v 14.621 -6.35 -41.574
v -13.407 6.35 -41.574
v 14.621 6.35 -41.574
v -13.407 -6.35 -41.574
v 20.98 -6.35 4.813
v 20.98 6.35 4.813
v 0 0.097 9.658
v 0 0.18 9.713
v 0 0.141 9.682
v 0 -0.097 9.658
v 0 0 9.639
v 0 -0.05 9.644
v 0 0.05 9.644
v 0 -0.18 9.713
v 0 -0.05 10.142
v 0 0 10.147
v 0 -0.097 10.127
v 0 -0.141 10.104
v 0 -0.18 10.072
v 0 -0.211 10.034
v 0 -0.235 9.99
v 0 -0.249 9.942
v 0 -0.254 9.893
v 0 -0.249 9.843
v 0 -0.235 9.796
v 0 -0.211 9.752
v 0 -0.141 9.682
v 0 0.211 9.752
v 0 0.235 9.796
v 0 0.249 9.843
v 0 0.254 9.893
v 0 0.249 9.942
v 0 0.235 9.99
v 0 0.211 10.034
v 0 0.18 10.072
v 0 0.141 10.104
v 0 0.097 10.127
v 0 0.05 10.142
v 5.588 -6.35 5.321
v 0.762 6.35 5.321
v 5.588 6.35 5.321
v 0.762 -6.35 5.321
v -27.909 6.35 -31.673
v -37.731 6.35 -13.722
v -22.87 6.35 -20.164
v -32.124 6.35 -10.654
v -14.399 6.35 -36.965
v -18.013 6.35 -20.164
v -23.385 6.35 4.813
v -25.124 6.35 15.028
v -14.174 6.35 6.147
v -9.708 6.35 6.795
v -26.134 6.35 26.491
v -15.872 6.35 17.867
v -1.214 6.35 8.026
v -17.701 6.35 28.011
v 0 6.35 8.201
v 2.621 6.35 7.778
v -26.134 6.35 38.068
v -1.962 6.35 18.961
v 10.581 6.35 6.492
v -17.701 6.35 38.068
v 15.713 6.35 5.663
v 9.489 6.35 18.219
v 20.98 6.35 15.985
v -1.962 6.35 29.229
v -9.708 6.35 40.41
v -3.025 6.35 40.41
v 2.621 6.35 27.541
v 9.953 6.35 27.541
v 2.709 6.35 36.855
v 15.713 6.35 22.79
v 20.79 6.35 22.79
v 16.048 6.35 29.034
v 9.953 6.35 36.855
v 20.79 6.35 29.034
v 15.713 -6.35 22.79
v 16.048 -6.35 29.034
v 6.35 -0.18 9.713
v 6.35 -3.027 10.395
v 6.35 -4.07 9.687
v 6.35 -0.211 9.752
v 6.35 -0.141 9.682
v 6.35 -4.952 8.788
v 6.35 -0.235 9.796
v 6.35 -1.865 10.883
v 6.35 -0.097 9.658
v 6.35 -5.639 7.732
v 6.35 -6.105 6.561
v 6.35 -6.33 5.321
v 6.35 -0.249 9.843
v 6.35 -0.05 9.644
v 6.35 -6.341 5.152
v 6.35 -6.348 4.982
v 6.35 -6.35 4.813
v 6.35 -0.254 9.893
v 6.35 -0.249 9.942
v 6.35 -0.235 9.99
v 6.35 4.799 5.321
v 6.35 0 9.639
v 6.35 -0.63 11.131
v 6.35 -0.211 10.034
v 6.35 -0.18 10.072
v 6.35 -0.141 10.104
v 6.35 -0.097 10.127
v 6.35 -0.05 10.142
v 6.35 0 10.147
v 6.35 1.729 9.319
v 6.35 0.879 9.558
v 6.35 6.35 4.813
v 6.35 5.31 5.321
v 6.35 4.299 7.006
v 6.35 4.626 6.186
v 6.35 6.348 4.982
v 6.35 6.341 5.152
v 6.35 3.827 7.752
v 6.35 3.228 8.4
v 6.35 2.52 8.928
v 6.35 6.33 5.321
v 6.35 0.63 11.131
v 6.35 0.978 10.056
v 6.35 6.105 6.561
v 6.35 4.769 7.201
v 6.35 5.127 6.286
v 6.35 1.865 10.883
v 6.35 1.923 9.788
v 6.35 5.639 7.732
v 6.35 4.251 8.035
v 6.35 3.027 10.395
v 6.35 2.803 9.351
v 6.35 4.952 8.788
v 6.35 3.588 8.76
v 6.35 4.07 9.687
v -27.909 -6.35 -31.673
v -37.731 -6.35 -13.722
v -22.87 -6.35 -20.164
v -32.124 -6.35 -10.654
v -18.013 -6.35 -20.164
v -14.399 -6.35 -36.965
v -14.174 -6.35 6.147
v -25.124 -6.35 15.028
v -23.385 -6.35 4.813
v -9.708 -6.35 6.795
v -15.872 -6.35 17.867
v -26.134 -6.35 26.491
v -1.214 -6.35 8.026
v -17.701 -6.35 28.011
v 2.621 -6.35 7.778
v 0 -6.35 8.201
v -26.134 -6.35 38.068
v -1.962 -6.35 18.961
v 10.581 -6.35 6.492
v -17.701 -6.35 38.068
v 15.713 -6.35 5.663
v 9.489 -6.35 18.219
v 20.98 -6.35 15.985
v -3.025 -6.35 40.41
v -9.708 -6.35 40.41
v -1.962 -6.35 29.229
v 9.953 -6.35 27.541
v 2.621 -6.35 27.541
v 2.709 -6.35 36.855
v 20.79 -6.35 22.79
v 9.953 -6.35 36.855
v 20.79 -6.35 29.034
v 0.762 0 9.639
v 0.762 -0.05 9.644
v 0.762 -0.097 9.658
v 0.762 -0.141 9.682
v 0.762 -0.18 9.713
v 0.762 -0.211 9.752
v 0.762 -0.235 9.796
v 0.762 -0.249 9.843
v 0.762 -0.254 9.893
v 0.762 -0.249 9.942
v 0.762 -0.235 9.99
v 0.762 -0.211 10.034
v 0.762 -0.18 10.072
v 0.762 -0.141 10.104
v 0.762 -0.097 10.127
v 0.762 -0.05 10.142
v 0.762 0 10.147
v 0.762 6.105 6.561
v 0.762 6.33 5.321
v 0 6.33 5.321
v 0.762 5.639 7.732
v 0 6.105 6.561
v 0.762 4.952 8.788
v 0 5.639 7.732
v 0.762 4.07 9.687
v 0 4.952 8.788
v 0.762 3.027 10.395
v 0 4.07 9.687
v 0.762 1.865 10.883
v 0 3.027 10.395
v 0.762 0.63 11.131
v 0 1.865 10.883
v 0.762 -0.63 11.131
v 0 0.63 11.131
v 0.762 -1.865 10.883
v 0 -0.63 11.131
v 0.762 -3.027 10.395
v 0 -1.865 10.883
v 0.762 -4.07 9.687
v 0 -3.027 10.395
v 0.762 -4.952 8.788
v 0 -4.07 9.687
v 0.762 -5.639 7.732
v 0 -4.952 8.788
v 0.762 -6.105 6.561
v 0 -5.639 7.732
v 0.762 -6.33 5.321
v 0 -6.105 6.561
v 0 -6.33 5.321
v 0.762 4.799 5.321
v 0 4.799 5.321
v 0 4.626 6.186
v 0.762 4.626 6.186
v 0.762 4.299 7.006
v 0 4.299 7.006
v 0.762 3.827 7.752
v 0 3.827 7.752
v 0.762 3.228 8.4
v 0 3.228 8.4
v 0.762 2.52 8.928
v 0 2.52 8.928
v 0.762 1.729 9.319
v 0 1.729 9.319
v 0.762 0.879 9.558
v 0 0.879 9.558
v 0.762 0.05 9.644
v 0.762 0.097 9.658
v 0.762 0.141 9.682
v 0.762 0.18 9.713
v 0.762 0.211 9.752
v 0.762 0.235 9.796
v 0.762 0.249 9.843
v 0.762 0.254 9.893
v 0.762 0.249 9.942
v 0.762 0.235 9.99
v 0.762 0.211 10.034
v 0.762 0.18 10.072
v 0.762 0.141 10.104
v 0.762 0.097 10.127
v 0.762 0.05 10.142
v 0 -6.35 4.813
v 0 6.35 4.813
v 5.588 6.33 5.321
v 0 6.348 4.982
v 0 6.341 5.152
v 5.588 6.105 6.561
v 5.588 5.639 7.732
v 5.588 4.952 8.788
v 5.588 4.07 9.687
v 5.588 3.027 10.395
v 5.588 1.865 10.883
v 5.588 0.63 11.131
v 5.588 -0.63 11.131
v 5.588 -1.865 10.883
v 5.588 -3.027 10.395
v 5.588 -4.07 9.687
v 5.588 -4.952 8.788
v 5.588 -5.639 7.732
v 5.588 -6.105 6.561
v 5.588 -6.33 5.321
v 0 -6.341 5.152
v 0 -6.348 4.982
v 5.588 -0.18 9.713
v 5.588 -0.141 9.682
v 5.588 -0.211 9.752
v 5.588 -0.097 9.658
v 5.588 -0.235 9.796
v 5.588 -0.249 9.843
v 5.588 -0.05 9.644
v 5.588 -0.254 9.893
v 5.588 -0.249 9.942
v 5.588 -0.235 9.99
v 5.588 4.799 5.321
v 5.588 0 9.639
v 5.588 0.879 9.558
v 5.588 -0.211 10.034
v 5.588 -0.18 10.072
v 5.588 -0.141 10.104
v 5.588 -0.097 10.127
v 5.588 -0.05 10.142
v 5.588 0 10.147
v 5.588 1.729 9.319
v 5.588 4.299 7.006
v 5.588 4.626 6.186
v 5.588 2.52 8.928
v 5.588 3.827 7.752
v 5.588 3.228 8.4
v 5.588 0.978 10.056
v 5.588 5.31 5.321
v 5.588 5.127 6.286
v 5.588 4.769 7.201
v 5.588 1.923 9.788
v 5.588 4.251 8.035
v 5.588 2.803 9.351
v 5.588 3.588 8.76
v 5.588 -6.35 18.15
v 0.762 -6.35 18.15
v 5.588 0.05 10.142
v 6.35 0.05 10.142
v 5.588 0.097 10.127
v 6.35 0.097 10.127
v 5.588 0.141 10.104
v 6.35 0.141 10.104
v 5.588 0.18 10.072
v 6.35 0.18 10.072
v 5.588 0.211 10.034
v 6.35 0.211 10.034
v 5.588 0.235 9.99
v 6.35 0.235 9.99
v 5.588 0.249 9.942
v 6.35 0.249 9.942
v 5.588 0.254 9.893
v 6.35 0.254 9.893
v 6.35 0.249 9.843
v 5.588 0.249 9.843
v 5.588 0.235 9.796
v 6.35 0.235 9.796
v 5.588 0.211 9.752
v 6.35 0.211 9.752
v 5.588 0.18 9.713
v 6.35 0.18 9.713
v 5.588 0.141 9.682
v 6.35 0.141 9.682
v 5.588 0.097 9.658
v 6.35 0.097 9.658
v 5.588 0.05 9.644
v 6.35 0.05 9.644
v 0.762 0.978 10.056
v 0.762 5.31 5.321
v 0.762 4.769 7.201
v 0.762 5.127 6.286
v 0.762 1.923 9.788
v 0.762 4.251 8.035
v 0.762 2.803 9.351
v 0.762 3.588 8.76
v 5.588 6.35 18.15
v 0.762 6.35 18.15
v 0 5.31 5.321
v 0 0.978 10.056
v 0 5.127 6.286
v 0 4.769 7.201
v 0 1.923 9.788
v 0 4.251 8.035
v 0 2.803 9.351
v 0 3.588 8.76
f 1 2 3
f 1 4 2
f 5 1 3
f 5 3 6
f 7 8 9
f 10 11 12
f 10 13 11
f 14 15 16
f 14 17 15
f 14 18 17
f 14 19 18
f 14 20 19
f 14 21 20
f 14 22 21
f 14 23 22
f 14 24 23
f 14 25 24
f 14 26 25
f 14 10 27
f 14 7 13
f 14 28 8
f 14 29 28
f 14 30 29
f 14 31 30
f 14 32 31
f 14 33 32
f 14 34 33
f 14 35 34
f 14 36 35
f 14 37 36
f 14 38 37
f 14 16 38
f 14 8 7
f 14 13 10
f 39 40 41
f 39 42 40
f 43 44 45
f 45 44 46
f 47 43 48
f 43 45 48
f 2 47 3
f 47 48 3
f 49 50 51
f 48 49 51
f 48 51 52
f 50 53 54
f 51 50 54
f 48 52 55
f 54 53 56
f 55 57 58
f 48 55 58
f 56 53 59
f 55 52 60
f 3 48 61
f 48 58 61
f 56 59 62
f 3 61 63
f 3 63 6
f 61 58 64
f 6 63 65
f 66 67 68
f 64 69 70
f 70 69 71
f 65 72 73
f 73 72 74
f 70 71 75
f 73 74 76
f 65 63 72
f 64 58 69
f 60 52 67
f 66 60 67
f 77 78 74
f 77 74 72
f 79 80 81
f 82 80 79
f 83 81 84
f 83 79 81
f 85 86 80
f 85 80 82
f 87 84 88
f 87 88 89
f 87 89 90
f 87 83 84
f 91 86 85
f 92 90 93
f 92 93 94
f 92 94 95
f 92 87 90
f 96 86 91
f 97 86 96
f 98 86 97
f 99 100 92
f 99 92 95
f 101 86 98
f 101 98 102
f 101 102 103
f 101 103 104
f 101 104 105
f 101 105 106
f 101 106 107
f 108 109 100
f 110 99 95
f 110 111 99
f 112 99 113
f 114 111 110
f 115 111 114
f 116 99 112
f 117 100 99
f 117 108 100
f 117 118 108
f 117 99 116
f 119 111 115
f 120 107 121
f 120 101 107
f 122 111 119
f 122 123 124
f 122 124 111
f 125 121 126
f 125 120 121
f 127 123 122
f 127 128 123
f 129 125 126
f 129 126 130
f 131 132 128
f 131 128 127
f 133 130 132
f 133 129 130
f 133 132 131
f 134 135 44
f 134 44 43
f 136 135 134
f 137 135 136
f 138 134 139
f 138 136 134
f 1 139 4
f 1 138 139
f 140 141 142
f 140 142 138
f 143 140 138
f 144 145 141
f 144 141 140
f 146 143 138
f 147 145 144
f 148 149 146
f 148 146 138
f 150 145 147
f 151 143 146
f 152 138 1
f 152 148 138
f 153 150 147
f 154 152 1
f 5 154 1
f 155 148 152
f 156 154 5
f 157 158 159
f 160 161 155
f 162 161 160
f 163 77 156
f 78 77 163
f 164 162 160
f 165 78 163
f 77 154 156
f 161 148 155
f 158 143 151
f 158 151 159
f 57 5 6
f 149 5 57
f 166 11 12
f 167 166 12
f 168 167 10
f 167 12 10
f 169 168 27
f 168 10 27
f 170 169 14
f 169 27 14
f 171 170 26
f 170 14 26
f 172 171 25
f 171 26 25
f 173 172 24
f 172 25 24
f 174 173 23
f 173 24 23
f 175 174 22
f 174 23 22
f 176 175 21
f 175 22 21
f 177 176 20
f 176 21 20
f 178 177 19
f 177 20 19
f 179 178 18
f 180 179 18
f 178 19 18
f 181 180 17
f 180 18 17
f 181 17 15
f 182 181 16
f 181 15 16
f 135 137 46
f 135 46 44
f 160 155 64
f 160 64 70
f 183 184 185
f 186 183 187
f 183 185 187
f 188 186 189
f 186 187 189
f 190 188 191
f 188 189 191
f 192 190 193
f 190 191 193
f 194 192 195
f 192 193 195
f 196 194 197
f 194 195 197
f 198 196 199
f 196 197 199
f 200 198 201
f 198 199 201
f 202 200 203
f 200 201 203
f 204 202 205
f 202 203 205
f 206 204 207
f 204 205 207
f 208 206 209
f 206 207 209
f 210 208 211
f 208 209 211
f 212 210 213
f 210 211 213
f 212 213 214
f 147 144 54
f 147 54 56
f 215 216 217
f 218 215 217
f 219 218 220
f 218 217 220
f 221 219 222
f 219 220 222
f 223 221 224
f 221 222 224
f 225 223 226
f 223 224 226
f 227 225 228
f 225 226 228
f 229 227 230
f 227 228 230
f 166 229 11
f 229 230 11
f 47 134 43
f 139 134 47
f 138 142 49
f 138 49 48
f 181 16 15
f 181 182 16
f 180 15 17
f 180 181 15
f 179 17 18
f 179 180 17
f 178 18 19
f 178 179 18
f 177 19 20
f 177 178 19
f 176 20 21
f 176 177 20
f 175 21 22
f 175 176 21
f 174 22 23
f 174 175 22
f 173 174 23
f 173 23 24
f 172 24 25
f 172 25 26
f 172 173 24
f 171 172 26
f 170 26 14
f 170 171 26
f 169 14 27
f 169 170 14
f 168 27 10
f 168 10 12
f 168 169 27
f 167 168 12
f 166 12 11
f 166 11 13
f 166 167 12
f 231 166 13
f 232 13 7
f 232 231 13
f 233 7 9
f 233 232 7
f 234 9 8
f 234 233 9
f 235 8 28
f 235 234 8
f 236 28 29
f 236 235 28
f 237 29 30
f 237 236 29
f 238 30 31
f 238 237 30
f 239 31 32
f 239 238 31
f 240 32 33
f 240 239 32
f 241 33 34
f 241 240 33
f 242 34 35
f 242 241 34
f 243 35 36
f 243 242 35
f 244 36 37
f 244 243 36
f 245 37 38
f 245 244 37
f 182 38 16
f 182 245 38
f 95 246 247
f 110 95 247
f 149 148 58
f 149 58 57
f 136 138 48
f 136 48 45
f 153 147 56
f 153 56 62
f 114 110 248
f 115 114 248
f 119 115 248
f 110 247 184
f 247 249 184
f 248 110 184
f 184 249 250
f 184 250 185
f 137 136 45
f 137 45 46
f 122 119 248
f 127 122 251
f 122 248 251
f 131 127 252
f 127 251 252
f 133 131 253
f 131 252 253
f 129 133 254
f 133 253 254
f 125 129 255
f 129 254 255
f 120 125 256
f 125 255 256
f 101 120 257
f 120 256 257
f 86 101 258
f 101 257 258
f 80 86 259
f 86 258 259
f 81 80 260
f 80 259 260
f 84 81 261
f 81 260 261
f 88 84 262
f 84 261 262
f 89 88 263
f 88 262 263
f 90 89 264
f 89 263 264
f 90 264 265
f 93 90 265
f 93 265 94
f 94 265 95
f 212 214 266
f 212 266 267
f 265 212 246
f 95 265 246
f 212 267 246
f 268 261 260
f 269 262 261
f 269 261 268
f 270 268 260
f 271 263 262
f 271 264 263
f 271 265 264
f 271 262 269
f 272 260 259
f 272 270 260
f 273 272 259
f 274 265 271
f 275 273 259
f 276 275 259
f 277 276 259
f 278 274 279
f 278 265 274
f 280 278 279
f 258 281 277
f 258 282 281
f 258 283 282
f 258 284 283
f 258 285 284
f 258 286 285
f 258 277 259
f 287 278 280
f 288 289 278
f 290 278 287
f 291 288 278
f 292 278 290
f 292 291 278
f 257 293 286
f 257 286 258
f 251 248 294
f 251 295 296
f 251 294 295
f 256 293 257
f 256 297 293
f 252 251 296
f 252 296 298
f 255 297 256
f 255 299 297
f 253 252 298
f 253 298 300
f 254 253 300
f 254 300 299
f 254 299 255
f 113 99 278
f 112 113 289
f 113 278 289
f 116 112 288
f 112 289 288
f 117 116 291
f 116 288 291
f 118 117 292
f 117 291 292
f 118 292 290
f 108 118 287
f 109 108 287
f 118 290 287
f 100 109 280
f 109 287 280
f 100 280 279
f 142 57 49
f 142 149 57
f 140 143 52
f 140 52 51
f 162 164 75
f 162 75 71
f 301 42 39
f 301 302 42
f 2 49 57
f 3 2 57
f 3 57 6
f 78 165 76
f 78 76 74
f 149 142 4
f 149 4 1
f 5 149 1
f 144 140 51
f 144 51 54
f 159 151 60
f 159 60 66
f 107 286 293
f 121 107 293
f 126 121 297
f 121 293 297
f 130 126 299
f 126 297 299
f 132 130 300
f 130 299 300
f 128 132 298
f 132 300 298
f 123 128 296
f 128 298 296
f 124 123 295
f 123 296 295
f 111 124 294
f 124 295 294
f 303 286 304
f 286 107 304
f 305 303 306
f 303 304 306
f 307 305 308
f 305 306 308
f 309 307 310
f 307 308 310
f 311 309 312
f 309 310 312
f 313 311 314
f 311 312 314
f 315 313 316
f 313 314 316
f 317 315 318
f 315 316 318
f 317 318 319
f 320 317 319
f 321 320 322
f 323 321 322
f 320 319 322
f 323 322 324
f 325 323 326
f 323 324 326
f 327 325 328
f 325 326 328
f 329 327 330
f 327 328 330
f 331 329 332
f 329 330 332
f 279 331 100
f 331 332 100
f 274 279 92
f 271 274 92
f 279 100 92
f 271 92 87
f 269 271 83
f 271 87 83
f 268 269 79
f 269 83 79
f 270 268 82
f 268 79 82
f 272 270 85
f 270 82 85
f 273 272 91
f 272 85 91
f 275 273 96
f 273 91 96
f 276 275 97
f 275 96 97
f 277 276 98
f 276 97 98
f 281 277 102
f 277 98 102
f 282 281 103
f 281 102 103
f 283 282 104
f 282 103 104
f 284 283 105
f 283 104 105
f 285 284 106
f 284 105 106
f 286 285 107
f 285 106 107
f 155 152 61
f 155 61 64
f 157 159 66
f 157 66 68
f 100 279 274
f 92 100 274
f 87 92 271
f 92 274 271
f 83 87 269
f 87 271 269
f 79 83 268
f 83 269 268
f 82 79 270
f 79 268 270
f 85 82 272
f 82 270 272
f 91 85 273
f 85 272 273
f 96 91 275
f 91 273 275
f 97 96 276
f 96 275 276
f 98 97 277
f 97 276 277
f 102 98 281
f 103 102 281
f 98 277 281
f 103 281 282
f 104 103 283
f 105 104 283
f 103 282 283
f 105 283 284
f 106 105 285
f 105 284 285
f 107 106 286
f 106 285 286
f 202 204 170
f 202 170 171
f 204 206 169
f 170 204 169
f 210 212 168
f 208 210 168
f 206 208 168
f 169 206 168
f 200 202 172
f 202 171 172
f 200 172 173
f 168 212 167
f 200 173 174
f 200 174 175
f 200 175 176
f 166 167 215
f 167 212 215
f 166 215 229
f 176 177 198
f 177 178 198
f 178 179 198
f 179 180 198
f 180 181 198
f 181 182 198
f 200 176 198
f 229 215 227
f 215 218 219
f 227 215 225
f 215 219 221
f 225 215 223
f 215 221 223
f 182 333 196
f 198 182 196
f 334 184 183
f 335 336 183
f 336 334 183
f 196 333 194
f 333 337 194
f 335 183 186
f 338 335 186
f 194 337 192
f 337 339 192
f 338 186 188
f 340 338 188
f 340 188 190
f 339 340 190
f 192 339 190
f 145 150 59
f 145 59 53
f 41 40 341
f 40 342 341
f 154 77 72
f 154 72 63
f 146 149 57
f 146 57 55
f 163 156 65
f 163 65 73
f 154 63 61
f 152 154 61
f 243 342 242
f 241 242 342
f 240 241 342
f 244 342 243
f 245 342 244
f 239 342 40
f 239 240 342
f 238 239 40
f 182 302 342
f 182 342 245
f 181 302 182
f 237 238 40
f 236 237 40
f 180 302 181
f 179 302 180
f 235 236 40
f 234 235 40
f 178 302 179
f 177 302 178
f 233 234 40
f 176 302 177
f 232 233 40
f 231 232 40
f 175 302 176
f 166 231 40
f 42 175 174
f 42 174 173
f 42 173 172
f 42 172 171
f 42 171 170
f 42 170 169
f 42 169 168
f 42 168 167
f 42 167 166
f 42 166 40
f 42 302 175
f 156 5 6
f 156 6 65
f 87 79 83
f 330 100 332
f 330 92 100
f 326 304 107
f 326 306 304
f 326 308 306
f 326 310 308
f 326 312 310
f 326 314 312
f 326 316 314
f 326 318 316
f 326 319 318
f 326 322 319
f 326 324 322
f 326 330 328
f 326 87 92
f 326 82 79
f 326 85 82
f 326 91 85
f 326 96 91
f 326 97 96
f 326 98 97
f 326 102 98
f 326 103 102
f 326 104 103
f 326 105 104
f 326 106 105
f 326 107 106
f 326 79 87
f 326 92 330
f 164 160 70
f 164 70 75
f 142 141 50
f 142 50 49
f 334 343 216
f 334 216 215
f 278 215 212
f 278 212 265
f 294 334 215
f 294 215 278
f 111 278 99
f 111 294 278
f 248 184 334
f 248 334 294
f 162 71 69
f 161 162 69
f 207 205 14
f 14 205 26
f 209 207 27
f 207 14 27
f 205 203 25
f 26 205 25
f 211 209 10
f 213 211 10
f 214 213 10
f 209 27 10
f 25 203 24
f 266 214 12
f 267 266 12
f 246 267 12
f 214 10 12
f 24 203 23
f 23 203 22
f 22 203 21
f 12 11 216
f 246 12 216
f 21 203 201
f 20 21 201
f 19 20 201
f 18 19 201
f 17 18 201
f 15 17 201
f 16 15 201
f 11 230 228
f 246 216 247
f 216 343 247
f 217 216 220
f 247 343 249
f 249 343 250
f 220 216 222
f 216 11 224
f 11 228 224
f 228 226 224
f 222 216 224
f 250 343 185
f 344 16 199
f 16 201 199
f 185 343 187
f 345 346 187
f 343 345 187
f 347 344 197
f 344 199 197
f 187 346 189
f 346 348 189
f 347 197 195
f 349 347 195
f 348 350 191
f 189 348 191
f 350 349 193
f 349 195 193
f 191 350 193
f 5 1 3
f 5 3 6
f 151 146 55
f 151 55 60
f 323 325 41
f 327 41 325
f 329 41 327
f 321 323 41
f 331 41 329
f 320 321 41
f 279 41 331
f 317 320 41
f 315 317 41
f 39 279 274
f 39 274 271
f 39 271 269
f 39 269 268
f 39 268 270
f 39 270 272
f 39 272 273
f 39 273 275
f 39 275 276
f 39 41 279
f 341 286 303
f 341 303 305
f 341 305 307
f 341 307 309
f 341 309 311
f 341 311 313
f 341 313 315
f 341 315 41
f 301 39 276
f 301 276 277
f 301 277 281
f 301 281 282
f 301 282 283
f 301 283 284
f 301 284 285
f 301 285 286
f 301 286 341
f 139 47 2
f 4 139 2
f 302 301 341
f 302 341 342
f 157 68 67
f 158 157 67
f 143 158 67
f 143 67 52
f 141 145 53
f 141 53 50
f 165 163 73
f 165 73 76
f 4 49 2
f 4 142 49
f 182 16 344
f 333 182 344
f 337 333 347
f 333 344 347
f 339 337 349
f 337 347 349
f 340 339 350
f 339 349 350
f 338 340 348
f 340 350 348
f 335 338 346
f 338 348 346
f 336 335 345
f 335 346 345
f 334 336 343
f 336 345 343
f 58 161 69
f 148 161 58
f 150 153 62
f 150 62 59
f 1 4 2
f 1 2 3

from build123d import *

# Parameters (mm, degrees)
F1_DEPTH      = 6.35
F3_DEPTH      = 6.35
F5_DEPTH      = 6.35
F6_W          = 4.826
F6_H          = 6.6525887966
F7_DEPTH      = 6.351
F7_DEPTH_BACK = 6.351
F9_DEPTH      = 6.35
F8_W          = 0.762
F8_H          = 0.254


with BuildPart() as f1:
    # F0 (on Front) → F1 (new body, symmetric)
    with BuildSketch(Plane.XZ):
        Polygon((-13.4074734524, -41.5735170245), (14.6206625799, -41.5735170245), (20.9797807038, 4.8127714545), (15.7129475847, 5.6634768114), (10.5813797563, 6.4923339523), (2.6212576711, 7.7780626524), (0, 8.2014514123), (-1.2141149422, 8.0255166458), (-9.7080478445, 6.7946792273), (-14.174283288, 6.1474867232), (-23.3850708102, 4.8127714545), (-18.0125854804, -20.164148882), (-14.3987512264, -36.9650231017), align=None)
        Polygon((15.7129475847, 5.6634768114), (20.9797807038, 4.8127714545), (20.9797807038, 15.9848444164), (15.7129475847, 15.9848444164), align=None)
        Polygon((-27.908615768, -31.6731445491), (-14.3987512264, -36.9650231017), (-18.0125854804, -20.164148882), (-22.8704996407, -20.164148882), (-32.1237929165, -10.6538189575), (-37.7309935831, -13.7219114453), align=None)
        Polygon((15.7129475847, 15.9848444164), (20.9797807038, 15.9848444164), (20.7898803055, 22.7895453572), (15.7129475847, 22.7895453572), align=None)
        Polygon((2.6212576711, 7.7780626524), (10.5813797563, 6.4923339523), (9.4885062426, 18.2192586362), (2.6212576711, 18.2192586362), align=None)
        Polygon((15.7129475847, 22.7895453572), (20.7898803055, 22.7895453572), (20.7898803055, 29.0344562382), (16.048182505, 29.0344562382), align=None)
        Polygon((-25.1239885919, 15.028355293), (-23.3850708102, 4.8127714545), (-14.174283288, 6.1474867232), (-15.8724822104, 17.8666524589), align=None)
        Polygon((2.6212576711, 18.2192586362), (9.4885062426, 18.2192586362), (9.9527947605, 27.540743351), (2.6212576711, 27.540743351), align=None)
        Polygon((-26.1335580658, 26.49136069), (-25.1239885919, 15.028355293), (-15.8724822104, 17.8666524589), (-17.7011438751, 28.0113672105), align=None)
        Polygon((2.6212576711, 27.540743351), (9.9527947605, 27.540743351), (9.9527947605, 36.8547067046), (2.7086019982, 36.8547067046), align=None)
        Polygon((-9.7080478445, 18.1460105085), (-9.7080478445, 6.7946792273), (-1.2141149422, 8.0255166458), (-1.9622561522, 18.9613569528), align=None)
        Polygon((-26.1335580658, 38.0676425993), (-26.1335580658, 26.49136069), (-17.7011438751, 28.0113672105), (-17.7011438751, 38.0676425993), align=None)
        Polygon((-9.7080478445, 29.2287375778), (-9.7080478445, 18.1460105085), (-1.9622561522, 18.9613569528), (-1.9622561522, 29.2287375778), align=None)
        Polygon((-9.7080478445, 40.4097996652), (-9.7080478445, 29.2287375778), (-1.9622561522, 29.2287375778), (-3.0251143035, 40.4097996652), align=None)
    extrude(amount=F1_DEPTH, both=True)


with BuildPart() as f3:
    # F2 (on Front) → F3 (new body, symmetric)
    with BuildSketch(Plane.XZ):
        Polygon((-23.3850708102, 4.8127714545), (-13.4074734524, -41.5735170245), (14.6206625799, -41.5735170245), (20.9797807038, 4.8127714545), (0, 8.2014514123), align=None)
    extrude(amount=F3_DEPTH, both=True)


with BuildPart() as f5:
    # F4 (on Right) → F5 (new body)
    with BuildSketch(Plane.YZ):
        with BuildLine():
            Line((-6.35, 4.8127714545), (4.826, 4.8127714545))
            ThreePointArc((4.826, 4.8127714545), (4.8192925091, 5.0671249716), (4.7991886814, 5.3207714545))
            Line((4.7991886814, 5.3207714545), (-6.3296473835, 5.3207714545))
            ThreePointArc((-6.3296473835, 5.3207714545), (-6.3449098057, 5.0669752256), (-6.35, 4.8127714545))
        make_face()
        with BuildLine():
            Line((4.826, 4.8127714545), (5.334, 4.8127714545))
            ThreePointArc((5.334, 4.8127714545), (5.3279351571, 5.0670605852), (5.3097544199, 5.3207714545))
            Line((5.3097544199, 5.3207714545), (4.7991886814, 5.3207714545))
            ThreePointArc((4.7991886814, 5.3207714545), (4.8192925091, 5.0671249716), (4.826, 4.8127714545))
        make_face()
        with BuildLine():
            Line((5.334, 4.8127714545), (6.35, 4.8127714545))
            ThreePointArc((6.35, 4.8127714545), (6.3449098057, 5.0669752256), (6.3296473835, 5.3207714545))
            Line((6.3296473835, 5.3207714545), (5.3097544199, 5.3207714545))
            ThreePointArc((5.3097544199, 5.3207714545), (5.3279351571, 5.0670605852), (5.334, 4.8127714545))
        make_face()
        with BuildLine():
            Line((5.3097544199, 5.3207714545), (6.3296473835, 5.3207714545))
            ThreePointArc((6.3296473835, 5.3207714545), (0, 11.1627714545), (-6.3296473835, 5.3207714545))
            Line((-6.3296473835, 5.3207714545), (4.7991886814, 5.3207714545))
            ThreePointArc((4.7991886814, 5.3207714545), (3.2278993169, 8.400380965), (0, 9.6387714545))
            ThreePointArc((0, 9.6387714545), (-0.254, 9.8927714545), (0, 10.1467714545))
            ThreePointArc((0, 10.1467714545), (3.5876095105, 8.7600001025), (5.3097544199, 5.3207714545))
        make_face()
    extrude(amount=F5_DEPTH)

    # F6 (on Front) → F7 (cut, two sides)
    with BuildSketch(Plane.XZ) as f7_sk:
        with Locations((3.175, 8.6470658527)):
            Rectangle(F6_W, F6_H)
    extrude(amount=-F7_DEPTH, mode=Mode.SUBTRACT)
    extrude(f7_sk.sketch, amount=F7_DEPTH_BACK, mode=Mode.SUBTRACT)


with BuildPart() as f9:
    # F8 (on Front) → F9 (new body, symmetric)
    with BuildSketch(Plane.XZ):
        Polygon((0.762, 5.3207714545), (5.588, 5.3207714545), (5.588, 9.6387714545), (5.588, 9.8927714545), (5.588, 10.1467714545), (5.588, 18.1501861662), (0.762, 18.1501861662), (0.762, 10.1467714545), (0.762, 9.8927714545), (0.762, 9.6387714545), align=None)
    extrude(amount=F9_DEPTH, both=True)

    # F8 (on Front) → F10 (revolve)
    with BuildSketch(Plane.XZ):
        with Locations((5.969, 10.0197714545)):
            Rectangle(F8_W, F8_H)
    revolve(axis=Axis((5.969, 0, 9.8927714545), (-1, 0, 0)))

    # F8 (on Front) → F11 (revolve)
    with BuildSketch(Plane.XZ):
        with Locations((0.381, 10.0197714545)):
            Rectangle(F8_W, F8_H)
    revolve(axis=Axis((0.381, 0, 9.8927714545), (1, 0, 0)))


solid = Compound([f1.part, f3.part, f5.part, f9.part])
